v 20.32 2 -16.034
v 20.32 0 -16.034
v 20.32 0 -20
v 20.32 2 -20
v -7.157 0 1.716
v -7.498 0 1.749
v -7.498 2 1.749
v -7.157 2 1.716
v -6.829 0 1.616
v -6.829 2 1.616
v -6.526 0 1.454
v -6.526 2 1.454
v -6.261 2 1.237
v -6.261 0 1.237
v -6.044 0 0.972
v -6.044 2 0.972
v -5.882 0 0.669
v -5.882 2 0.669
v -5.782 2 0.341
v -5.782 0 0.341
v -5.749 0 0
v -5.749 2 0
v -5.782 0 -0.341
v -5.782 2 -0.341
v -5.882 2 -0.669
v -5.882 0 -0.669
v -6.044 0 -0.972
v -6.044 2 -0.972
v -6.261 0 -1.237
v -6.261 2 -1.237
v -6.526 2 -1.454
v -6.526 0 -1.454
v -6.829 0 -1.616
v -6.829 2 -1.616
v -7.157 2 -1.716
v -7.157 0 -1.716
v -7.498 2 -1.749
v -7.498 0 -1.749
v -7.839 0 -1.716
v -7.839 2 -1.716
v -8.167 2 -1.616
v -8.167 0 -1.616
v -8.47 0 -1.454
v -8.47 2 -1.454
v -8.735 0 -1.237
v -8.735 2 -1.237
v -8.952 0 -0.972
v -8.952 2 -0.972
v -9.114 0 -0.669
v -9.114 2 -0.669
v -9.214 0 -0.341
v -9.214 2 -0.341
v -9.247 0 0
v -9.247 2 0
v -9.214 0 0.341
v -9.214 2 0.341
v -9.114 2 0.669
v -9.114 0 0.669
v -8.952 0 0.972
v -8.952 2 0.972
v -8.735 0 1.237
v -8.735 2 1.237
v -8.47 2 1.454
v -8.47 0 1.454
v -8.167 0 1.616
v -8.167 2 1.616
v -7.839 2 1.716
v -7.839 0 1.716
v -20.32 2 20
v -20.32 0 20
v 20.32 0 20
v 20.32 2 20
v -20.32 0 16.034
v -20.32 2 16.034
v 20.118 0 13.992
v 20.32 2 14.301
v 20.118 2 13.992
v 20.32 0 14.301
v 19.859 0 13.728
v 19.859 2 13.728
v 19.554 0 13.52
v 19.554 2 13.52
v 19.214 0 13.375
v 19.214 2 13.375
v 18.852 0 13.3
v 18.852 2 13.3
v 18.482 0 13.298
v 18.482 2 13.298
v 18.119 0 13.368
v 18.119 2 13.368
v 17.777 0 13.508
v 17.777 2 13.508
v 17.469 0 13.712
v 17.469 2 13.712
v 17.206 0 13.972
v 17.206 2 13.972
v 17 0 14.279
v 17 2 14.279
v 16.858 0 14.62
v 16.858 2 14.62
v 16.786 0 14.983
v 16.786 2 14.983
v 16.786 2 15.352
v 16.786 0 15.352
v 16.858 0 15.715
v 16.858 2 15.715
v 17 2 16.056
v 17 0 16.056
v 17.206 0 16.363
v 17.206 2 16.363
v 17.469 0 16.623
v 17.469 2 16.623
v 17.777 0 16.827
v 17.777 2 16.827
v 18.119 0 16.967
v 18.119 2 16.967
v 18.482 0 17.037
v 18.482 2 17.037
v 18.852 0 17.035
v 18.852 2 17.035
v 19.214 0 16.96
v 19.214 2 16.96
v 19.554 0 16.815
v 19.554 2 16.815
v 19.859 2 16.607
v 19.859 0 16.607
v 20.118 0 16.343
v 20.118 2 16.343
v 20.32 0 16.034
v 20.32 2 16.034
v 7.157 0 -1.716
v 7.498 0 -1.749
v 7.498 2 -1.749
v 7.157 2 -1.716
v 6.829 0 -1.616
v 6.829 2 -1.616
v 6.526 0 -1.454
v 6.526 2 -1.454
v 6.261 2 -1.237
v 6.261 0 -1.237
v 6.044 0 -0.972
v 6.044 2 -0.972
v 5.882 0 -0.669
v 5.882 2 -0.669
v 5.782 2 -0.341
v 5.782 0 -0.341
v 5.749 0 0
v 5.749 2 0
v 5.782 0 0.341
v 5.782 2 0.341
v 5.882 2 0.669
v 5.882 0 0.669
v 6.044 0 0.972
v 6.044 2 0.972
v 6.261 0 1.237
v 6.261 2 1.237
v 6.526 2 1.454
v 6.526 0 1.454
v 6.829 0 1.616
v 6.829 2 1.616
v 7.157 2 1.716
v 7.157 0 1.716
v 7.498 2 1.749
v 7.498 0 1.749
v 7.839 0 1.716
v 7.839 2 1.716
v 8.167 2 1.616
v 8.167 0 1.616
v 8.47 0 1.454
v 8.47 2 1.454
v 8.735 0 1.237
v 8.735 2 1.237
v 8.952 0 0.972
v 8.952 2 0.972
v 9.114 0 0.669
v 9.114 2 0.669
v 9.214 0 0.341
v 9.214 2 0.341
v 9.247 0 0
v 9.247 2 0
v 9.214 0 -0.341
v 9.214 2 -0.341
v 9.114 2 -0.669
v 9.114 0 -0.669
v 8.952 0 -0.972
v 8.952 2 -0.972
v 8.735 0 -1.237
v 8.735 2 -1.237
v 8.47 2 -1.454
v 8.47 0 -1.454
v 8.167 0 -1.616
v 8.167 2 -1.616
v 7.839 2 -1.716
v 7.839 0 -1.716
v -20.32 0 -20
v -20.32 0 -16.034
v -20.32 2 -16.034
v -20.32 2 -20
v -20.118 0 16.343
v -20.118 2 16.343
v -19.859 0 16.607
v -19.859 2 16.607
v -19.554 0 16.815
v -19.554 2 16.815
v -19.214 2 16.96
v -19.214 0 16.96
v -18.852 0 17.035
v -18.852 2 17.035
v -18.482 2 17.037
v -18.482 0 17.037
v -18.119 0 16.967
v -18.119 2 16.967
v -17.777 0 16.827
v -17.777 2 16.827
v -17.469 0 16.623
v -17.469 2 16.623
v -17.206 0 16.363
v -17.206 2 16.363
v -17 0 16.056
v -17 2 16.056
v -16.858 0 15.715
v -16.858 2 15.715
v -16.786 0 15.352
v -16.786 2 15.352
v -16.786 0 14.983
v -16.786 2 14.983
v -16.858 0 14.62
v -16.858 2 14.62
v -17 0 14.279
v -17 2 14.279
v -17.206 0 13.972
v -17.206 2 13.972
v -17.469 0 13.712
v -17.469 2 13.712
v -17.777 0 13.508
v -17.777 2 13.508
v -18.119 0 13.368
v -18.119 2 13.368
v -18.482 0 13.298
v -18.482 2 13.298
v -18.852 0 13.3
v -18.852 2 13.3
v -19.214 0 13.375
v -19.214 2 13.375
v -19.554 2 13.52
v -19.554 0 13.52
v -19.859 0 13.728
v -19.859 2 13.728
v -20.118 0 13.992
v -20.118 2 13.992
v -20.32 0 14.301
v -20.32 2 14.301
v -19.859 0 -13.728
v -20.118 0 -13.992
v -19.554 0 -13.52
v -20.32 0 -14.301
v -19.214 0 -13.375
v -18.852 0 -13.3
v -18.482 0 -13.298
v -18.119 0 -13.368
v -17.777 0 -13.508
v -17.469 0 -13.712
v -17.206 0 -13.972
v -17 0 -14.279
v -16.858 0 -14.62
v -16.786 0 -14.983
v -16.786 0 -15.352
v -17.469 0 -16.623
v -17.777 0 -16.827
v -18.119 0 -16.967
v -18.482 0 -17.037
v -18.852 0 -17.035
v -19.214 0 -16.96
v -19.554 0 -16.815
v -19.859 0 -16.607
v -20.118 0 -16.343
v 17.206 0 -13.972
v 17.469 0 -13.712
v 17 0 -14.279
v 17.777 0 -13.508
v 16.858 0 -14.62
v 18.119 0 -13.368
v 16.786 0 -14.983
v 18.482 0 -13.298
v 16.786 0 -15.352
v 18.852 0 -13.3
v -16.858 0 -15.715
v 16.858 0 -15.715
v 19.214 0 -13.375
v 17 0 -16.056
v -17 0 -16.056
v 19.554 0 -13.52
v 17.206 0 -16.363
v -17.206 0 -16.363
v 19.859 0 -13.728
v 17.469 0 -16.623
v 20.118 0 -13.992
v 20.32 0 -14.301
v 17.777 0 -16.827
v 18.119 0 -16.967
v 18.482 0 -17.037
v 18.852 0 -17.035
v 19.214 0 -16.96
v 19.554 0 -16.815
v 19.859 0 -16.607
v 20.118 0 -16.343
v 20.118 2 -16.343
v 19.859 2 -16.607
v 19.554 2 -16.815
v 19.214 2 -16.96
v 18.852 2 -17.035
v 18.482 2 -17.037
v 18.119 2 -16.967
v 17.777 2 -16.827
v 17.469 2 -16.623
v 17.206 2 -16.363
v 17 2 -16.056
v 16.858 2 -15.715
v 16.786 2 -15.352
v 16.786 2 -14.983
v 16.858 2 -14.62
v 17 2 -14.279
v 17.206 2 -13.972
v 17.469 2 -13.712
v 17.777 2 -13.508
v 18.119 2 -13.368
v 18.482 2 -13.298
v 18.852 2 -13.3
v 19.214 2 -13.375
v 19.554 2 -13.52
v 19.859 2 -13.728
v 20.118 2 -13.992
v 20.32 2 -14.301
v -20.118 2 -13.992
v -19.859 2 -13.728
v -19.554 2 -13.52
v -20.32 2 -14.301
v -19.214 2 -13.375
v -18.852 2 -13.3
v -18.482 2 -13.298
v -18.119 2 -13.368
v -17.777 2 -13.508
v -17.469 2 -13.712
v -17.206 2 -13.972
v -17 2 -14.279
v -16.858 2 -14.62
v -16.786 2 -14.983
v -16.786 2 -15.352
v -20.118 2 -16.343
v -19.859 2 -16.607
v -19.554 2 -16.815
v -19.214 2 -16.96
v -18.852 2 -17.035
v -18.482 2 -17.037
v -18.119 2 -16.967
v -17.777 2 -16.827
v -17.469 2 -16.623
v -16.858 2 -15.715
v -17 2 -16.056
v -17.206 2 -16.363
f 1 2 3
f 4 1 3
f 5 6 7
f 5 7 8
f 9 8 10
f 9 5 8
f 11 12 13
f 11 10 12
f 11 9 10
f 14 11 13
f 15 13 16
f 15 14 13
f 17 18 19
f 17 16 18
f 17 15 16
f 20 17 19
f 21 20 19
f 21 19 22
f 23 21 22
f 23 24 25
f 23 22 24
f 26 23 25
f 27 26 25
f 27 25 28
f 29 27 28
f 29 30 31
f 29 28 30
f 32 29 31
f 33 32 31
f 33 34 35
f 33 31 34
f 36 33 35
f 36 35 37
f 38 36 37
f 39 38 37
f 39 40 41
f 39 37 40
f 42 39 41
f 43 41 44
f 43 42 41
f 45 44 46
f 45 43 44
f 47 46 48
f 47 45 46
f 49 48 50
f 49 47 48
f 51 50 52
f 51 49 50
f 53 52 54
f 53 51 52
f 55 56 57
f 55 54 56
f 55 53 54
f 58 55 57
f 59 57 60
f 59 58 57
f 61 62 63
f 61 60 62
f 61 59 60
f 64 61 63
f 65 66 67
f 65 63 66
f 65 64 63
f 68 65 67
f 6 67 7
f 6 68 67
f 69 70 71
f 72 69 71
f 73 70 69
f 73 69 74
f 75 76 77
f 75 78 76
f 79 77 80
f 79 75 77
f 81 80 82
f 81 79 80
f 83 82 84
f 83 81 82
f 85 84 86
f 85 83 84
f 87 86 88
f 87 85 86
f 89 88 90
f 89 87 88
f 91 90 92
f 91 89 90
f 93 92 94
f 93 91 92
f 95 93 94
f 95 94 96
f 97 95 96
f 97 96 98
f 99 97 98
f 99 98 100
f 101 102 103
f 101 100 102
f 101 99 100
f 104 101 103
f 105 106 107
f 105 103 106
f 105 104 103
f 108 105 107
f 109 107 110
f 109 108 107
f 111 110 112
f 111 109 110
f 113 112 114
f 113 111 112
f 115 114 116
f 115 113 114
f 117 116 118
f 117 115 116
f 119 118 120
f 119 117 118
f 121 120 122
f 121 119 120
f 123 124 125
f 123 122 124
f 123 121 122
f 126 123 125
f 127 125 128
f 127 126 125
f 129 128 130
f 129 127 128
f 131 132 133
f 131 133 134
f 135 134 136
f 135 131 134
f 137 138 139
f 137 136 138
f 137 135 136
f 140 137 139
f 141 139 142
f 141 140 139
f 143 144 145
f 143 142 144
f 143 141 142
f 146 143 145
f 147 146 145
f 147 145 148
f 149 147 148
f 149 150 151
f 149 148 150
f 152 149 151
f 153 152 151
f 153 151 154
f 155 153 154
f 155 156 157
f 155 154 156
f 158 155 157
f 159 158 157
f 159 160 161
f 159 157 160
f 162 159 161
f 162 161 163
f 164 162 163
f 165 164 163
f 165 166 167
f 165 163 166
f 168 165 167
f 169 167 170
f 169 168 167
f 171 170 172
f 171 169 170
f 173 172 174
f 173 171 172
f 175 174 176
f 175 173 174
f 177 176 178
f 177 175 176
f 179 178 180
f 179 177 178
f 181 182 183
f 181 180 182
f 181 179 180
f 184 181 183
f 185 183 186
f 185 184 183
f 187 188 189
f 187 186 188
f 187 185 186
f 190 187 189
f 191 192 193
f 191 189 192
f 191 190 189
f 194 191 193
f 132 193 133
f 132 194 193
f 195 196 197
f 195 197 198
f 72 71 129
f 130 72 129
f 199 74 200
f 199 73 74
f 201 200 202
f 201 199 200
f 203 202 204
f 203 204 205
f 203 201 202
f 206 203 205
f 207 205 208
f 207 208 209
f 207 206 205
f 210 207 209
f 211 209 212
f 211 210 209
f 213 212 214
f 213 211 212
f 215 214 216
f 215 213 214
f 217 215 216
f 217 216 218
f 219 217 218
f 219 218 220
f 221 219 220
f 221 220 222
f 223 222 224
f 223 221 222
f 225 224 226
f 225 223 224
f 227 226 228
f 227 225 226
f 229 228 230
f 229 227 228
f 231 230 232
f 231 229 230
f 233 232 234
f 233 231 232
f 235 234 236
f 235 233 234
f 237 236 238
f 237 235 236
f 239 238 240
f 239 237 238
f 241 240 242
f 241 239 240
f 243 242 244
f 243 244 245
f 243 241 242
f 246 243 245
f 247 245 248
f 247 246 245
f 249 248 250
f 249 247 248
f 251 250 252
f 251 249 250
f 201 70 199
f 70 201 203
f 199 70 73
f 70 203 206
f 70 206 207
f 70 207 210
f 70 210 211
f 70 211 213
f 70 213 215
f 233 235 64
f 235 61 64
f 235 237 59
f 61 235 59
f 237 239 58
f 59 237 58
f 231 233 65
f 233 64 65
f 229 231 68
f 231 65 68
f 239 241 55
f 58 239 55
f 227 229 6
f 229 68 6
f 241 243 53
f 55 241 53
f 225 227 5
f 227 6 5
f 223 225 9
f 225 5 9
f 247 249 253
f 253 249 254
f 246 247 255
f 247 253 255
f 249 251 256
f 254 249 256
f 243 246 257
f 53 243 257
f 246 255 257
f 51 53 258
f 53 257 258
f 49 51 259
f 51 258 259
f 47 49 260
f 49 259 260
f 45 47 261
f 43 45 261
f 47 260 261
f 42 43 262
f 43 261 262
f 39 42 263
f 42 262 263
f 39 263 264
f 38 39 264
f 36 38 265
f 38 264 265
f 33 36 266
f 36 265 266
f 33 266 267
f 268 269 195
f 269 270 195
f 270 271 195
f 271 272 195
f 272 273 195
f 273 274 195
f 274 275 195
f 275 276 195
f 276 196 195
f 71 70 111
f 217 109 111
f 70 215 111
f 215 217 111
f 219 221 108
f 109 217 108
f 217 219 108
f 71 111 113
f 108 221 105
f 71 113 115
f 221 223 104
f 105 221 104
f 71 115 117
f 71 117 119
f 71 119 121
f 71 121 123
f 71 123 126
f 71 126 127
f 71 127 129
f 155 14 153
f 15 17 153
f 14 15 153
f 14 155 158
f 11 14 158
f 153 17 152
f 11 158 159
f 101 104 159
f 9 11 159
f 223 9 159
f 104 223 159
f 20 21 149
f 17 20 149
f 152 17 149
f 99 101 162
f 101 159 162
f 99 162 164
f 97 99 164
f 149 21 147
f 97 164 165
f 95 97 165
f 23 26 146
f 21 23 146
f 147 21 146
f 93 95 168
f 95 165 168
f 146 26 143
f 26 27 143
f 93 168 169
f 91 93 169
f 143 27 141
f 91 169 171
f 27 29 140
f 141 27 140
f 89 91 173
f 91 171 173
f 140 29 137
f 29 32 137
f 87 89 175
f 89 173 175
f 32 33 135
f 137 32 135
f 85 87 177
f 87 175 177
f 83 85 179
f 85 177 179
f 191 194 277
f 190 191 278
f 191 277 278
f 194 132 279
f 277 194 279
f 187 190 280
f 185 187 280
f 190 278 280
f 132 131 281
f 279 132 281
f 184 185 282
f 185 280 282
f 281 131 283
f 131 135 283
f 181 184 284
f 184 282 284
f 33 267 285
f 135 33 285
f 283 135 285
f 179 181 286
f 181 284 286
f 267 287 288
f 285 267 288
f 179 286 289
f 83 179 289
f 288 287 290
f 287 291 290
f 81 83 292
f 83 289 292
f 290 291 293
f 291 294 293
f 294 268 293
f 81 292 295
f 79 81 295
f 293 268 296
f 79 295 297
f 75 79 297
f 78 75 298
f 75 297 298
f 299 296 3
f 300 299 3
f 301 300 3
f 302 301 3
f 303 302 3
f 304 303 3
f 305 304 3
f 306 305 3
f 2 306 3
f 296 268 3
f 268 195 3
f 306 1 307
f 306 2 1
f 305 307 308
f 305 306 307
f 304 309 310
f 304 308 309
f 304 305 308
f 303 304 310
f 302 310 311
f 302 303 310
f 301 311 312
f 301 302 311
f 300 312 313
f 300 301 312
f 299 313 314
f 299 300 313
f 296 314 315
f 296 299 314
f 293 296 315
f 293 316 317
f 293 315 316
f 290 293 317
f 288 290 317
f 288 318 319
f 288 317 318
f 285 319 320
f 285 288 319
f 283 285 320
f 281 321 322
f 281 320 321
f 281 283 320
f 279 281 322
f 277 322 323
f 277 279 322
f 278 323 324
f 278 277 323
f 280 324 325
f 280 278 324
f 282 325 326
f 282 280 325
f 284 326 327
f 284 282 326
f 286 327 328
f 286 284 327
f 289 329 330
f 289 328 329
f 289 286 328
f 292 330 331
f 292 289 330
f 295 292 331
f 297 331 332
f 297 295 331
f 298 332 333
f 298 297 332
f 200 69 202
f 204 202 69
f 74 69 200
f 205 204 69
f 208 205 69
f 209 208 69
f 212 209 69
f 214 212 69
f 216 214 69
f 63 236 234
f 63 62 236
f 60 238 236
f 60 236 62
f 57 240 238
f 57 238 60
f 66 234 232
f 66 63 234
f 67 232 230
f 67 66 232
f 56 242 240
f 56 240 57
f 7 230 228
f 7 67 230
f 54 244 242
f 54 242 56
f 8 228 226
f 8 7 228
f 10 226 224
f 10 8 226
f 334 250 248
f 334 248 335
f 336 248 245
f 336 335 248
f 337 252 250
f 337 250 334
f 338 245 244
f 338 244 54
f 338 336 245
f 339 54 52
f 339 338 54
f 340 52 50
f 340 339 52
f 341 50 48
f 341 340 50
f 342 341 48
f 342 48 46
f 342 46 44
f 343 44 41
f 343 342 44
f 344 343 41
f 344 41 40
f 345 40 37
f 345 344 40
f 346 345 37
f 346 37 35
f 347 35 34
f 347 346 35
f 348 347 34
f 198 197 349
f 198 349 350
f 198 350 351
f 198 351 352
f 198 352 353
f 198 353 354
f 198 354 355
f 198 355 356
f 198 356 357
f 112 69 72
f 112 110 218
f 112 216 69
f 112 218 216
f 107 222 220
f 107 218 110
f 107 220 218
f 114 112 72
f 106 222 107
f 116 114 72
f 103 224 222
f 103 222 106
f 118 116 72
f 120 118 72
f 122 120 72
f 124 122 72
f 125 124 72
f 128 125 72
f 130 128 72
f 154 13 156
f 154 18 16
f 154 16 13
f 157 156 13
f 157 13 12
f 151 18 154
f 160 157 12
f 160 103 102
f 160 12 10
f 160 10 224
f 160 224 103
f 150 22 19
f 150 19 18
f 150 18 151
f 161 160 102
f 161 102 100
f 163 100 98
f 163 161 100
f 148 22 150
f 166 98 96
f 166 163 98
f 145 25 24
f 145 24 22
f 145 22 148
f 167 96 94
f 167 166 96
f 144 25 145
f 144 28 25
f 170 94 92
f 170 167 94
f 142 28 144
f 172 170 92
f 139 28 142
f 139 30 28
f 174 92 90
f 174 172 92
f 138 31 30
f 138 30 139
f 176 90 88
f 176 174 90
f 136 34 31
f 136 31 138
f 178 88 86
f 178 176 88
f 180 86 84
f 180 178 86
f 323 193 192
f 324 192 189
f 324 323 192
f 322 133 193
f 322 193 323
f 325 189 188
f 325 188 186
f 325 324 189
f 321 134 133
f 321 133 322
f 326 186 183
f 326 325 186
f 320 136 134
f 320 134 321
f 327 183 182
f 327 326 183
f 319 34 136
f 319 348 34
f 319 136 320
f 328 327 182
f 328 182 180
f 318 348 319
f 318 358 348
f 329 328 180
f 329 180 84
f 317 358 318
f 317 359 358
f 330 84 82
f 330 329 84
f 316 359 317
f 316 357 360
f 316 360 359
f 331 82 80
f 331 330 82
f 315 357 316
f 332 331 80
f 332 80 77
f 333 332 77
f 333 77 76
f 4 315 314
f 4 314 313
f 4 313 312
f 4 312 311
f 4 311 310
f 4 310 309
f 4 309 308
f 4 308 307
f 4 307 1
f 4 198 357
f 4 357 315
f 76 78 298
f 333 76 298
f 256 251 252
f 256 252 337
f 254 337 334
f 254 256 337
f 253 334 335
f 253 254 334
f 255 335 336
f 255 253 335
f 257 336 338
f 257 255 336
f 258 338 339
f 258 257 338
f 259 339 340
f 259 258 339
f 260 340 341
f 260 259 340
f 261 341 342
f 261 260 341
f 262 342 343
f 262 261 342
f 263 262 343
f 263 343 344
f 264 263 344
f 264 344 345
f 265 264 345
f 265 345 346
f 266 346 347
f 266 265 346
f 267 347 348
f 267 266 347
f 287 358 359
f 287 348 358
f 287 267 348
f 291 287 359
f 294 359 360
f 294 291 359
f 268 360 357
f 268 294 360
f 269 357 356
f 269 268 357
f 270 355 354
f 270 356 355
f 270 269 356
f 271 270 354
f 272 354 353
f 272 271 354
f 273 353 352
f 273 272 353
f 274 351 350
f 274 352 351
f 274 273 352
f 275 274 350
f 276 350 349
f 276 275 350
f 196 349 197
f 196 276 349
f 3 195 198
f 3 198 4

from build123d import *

# Parameters (mm, degrees)
SKETCH1_W               = 40.64
SKETCH1_H               = 39.9999962
BOSS_EXTRUDE1_DEPTH     = 1.999996
CUT_EXTRUDE1_DEPTH      = 29.5815029
CUT_EXTRUDE1_DEPTH_BACK = 29.5815029
SKETCH2_R               = 1.877518959
SKETCH2_R_2             = 1.749160226


with BuildPart() as part:
    # Sketch1 → Boss-Extrude1 (new body)
    with BuildSketch(Plane(origin=(0, 0, 0), x_dir=(1, 0, 0), z_dir=(0, 1, 0))):
        Rectangle(SKETCH1_W, SKETCH1_H)
    extrude(amount=BOSS_EXTRUDE1_DEPTH)

    # Sketch2 → Cut-Extrude1 (cut, two sides: drawn at the far end of the back side and taken through both)
    with BuildSketch(Plane(origin=(0, 1.999996, 0), x_dir=(1, 0, 0), z_dir=(0, 1, 0)).offset(-CUT_EXTRUDE1_DEPTH_BACK)):
        with Locations((-18.654170648, 15.167488224)):
            Circle(SKETCH2_R)
        with Locations((-18.654170648, -15.167488224)):
            Circle(SKETCH2_R)
        with Locations((18.654170648, -15.167488224)):
            Circle(SKETCH2_R)
        with Locations((18.654170648, 15.167488224)):
            Circle(SKETCH2_R)
        with Locations(Location((-7.497989174, 0, 0), (0, 0, 270))):
            Circle(SKETCH2_R_2)
        with Locations(Location((7.497989174, 0, 0), (0, 0, 90))):
            Circle(SKETCH2_R_2)
    extrude(amount=CUT_EXTRUDE1_DEPTH + CUT_EXTRUDE1_DEPTH_BACK, mode=Mode.SUBTRACT)


solid = part.part
